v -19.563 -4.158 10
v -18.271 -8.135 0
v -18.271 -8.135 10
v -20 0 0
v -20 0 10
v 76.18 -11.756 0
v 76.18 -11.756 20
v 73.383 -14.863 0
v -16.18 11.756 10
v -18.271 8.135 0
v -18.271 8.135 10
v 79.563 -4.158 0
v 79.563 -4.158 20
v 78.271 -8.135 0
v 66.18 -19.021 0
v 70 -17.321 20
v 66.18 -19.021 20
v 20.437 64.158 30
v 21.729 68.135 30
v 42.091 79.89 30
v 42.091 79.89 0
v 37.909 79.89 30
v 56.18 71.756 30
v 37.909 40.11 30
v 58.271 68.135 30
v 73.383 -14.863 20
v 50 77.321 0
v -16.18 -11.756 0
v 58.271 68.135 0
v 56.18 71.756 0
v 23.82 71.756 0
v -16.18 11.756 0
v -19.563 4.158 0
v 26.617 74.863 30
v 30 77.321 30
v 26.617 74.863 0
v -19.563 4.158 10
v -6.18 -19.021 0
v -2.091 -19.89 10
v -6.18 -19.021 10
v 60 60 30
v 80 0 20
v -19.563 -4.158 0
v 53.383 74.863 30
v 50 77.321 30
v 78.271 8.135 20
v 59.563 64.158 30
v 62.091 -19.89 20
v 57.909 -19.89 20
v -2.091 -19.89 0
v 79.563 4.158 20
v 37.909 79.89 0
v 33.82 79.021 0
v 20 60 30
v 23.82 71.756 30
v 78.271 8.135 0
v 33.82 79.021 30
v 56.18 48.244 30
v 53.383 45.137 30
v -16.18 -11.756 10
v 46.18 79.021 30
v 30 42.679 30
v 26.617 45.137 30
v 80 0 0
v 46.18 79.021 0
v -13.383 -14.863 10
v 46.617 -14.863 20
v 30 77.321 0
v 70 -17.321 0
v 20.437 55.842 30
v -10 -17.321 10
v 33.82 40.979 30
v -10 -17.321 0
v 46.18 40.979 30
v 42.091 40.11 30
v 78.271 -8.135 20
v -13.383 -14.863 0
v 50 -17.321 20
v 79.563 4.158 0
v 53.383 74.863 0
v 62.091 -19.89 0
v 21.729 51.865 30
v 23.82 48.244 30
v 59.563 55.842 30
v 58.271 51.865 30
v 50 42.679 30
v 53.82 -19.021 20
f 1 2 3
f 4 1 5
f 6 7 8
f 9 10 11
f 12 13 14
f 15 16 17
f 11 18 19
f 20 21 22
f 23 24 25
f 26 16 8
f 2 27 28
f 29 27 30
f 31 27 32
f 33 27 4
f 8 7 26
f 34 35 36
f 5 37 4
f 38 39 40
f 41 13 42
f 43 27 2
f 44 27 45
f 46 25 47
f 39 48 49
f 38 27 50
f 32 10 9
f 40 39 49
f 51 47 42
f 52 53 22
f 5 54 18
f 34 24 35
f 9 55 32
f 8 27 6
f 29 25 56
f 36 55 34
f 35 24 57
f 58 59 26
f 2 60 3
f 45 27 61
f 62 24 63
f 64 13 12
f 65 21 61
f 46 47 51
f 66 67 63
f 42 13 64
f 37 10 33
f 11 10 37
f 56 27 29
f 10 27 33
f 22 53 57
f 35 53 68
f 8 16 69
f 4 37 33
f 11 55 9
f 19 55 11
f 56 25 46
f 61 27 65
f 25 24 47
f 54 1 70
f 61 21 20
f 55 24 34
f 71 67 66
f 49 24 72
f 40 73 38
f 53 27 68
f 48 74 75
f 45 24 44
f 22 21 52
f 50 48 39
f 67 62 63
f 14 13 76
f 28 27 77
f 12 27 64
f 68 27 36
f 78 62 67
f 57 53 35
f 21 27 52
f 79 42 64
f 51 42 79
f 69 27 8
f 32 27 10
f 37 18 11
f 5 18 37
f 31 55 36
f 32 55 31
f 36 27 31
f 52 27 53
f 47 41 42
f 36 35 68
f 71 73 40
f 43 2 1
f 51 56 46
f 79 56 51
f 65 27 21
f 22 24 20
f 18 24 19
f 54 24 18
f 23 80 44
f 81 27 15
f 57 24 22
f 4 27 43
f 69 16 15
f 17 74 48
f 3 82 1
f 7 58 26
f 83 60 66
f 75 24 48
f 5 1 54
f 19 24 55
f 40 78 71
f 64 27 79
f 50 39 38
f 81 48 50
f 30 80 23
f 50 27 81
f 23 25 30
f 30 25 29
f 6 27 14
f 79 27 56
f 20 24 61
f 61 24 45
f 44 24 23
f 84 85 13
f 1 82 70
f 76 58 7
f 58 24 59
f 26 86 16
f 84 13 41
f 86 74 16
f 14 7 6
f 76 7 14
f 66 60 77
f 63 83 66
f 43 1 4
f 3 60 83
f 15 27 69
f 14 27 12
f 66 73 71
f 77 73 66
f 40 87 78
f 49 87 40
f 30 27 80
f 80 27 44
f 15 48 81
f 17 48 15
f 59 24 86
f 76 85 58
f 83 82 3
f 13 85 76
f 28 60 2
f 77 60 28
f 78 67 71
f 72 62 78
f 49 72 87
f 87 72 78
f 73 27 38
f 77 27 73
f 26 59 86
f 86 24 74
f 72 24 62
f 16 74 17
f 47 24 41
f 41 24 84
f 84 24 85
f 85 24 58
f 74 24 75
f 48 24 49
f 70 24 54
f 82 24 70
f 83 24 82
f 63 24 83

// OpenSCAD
module placa_snowboard(grosime,raza,lungime)//astia din paranteza sunt parametrii pe care ii dau eu
{
cylinder(h=grosime,r=raza);

translate ([lungime-2*raza,0,0])cylinder(h=grosime,r=raza);
    
    translate([0,-raza,0])cube([lungime-2*raza,2*raza,grosime]);
}
//---------------
module placa_snowboard2(grosime,raza,lungime)//astia din paranteza sunt parametrii pe care ii dau eu
{
    hull(){
        cylinder(h=grosime,r=raza);

            translate ([lungime-2*raza,0,0])cylinder(h=2*grosime,r=raza);
     
    }
}
//------------

module podium(grosime,raza,lungime)//astia din paranteza sunt parametrii pe care ii dau eu
{
    hull(){
        cylinder(h=grosime,r=raza);

            translate ([lungime-2*raza,0,0])cylinder(h=2*grosime,r=raza);
     
        translate([(lungime-raza)/2,lungime-2*raza,0])
        cylinder(h=3*grosime,r=raza);
    }
}
//---------------
//placa_snowboard2(grosime=10,raza=20,lungime=100);
//placa_snowboard(grosime=10,raza=20,lungime=100);
podium(grosime=10,raza=20,lungime=100);
